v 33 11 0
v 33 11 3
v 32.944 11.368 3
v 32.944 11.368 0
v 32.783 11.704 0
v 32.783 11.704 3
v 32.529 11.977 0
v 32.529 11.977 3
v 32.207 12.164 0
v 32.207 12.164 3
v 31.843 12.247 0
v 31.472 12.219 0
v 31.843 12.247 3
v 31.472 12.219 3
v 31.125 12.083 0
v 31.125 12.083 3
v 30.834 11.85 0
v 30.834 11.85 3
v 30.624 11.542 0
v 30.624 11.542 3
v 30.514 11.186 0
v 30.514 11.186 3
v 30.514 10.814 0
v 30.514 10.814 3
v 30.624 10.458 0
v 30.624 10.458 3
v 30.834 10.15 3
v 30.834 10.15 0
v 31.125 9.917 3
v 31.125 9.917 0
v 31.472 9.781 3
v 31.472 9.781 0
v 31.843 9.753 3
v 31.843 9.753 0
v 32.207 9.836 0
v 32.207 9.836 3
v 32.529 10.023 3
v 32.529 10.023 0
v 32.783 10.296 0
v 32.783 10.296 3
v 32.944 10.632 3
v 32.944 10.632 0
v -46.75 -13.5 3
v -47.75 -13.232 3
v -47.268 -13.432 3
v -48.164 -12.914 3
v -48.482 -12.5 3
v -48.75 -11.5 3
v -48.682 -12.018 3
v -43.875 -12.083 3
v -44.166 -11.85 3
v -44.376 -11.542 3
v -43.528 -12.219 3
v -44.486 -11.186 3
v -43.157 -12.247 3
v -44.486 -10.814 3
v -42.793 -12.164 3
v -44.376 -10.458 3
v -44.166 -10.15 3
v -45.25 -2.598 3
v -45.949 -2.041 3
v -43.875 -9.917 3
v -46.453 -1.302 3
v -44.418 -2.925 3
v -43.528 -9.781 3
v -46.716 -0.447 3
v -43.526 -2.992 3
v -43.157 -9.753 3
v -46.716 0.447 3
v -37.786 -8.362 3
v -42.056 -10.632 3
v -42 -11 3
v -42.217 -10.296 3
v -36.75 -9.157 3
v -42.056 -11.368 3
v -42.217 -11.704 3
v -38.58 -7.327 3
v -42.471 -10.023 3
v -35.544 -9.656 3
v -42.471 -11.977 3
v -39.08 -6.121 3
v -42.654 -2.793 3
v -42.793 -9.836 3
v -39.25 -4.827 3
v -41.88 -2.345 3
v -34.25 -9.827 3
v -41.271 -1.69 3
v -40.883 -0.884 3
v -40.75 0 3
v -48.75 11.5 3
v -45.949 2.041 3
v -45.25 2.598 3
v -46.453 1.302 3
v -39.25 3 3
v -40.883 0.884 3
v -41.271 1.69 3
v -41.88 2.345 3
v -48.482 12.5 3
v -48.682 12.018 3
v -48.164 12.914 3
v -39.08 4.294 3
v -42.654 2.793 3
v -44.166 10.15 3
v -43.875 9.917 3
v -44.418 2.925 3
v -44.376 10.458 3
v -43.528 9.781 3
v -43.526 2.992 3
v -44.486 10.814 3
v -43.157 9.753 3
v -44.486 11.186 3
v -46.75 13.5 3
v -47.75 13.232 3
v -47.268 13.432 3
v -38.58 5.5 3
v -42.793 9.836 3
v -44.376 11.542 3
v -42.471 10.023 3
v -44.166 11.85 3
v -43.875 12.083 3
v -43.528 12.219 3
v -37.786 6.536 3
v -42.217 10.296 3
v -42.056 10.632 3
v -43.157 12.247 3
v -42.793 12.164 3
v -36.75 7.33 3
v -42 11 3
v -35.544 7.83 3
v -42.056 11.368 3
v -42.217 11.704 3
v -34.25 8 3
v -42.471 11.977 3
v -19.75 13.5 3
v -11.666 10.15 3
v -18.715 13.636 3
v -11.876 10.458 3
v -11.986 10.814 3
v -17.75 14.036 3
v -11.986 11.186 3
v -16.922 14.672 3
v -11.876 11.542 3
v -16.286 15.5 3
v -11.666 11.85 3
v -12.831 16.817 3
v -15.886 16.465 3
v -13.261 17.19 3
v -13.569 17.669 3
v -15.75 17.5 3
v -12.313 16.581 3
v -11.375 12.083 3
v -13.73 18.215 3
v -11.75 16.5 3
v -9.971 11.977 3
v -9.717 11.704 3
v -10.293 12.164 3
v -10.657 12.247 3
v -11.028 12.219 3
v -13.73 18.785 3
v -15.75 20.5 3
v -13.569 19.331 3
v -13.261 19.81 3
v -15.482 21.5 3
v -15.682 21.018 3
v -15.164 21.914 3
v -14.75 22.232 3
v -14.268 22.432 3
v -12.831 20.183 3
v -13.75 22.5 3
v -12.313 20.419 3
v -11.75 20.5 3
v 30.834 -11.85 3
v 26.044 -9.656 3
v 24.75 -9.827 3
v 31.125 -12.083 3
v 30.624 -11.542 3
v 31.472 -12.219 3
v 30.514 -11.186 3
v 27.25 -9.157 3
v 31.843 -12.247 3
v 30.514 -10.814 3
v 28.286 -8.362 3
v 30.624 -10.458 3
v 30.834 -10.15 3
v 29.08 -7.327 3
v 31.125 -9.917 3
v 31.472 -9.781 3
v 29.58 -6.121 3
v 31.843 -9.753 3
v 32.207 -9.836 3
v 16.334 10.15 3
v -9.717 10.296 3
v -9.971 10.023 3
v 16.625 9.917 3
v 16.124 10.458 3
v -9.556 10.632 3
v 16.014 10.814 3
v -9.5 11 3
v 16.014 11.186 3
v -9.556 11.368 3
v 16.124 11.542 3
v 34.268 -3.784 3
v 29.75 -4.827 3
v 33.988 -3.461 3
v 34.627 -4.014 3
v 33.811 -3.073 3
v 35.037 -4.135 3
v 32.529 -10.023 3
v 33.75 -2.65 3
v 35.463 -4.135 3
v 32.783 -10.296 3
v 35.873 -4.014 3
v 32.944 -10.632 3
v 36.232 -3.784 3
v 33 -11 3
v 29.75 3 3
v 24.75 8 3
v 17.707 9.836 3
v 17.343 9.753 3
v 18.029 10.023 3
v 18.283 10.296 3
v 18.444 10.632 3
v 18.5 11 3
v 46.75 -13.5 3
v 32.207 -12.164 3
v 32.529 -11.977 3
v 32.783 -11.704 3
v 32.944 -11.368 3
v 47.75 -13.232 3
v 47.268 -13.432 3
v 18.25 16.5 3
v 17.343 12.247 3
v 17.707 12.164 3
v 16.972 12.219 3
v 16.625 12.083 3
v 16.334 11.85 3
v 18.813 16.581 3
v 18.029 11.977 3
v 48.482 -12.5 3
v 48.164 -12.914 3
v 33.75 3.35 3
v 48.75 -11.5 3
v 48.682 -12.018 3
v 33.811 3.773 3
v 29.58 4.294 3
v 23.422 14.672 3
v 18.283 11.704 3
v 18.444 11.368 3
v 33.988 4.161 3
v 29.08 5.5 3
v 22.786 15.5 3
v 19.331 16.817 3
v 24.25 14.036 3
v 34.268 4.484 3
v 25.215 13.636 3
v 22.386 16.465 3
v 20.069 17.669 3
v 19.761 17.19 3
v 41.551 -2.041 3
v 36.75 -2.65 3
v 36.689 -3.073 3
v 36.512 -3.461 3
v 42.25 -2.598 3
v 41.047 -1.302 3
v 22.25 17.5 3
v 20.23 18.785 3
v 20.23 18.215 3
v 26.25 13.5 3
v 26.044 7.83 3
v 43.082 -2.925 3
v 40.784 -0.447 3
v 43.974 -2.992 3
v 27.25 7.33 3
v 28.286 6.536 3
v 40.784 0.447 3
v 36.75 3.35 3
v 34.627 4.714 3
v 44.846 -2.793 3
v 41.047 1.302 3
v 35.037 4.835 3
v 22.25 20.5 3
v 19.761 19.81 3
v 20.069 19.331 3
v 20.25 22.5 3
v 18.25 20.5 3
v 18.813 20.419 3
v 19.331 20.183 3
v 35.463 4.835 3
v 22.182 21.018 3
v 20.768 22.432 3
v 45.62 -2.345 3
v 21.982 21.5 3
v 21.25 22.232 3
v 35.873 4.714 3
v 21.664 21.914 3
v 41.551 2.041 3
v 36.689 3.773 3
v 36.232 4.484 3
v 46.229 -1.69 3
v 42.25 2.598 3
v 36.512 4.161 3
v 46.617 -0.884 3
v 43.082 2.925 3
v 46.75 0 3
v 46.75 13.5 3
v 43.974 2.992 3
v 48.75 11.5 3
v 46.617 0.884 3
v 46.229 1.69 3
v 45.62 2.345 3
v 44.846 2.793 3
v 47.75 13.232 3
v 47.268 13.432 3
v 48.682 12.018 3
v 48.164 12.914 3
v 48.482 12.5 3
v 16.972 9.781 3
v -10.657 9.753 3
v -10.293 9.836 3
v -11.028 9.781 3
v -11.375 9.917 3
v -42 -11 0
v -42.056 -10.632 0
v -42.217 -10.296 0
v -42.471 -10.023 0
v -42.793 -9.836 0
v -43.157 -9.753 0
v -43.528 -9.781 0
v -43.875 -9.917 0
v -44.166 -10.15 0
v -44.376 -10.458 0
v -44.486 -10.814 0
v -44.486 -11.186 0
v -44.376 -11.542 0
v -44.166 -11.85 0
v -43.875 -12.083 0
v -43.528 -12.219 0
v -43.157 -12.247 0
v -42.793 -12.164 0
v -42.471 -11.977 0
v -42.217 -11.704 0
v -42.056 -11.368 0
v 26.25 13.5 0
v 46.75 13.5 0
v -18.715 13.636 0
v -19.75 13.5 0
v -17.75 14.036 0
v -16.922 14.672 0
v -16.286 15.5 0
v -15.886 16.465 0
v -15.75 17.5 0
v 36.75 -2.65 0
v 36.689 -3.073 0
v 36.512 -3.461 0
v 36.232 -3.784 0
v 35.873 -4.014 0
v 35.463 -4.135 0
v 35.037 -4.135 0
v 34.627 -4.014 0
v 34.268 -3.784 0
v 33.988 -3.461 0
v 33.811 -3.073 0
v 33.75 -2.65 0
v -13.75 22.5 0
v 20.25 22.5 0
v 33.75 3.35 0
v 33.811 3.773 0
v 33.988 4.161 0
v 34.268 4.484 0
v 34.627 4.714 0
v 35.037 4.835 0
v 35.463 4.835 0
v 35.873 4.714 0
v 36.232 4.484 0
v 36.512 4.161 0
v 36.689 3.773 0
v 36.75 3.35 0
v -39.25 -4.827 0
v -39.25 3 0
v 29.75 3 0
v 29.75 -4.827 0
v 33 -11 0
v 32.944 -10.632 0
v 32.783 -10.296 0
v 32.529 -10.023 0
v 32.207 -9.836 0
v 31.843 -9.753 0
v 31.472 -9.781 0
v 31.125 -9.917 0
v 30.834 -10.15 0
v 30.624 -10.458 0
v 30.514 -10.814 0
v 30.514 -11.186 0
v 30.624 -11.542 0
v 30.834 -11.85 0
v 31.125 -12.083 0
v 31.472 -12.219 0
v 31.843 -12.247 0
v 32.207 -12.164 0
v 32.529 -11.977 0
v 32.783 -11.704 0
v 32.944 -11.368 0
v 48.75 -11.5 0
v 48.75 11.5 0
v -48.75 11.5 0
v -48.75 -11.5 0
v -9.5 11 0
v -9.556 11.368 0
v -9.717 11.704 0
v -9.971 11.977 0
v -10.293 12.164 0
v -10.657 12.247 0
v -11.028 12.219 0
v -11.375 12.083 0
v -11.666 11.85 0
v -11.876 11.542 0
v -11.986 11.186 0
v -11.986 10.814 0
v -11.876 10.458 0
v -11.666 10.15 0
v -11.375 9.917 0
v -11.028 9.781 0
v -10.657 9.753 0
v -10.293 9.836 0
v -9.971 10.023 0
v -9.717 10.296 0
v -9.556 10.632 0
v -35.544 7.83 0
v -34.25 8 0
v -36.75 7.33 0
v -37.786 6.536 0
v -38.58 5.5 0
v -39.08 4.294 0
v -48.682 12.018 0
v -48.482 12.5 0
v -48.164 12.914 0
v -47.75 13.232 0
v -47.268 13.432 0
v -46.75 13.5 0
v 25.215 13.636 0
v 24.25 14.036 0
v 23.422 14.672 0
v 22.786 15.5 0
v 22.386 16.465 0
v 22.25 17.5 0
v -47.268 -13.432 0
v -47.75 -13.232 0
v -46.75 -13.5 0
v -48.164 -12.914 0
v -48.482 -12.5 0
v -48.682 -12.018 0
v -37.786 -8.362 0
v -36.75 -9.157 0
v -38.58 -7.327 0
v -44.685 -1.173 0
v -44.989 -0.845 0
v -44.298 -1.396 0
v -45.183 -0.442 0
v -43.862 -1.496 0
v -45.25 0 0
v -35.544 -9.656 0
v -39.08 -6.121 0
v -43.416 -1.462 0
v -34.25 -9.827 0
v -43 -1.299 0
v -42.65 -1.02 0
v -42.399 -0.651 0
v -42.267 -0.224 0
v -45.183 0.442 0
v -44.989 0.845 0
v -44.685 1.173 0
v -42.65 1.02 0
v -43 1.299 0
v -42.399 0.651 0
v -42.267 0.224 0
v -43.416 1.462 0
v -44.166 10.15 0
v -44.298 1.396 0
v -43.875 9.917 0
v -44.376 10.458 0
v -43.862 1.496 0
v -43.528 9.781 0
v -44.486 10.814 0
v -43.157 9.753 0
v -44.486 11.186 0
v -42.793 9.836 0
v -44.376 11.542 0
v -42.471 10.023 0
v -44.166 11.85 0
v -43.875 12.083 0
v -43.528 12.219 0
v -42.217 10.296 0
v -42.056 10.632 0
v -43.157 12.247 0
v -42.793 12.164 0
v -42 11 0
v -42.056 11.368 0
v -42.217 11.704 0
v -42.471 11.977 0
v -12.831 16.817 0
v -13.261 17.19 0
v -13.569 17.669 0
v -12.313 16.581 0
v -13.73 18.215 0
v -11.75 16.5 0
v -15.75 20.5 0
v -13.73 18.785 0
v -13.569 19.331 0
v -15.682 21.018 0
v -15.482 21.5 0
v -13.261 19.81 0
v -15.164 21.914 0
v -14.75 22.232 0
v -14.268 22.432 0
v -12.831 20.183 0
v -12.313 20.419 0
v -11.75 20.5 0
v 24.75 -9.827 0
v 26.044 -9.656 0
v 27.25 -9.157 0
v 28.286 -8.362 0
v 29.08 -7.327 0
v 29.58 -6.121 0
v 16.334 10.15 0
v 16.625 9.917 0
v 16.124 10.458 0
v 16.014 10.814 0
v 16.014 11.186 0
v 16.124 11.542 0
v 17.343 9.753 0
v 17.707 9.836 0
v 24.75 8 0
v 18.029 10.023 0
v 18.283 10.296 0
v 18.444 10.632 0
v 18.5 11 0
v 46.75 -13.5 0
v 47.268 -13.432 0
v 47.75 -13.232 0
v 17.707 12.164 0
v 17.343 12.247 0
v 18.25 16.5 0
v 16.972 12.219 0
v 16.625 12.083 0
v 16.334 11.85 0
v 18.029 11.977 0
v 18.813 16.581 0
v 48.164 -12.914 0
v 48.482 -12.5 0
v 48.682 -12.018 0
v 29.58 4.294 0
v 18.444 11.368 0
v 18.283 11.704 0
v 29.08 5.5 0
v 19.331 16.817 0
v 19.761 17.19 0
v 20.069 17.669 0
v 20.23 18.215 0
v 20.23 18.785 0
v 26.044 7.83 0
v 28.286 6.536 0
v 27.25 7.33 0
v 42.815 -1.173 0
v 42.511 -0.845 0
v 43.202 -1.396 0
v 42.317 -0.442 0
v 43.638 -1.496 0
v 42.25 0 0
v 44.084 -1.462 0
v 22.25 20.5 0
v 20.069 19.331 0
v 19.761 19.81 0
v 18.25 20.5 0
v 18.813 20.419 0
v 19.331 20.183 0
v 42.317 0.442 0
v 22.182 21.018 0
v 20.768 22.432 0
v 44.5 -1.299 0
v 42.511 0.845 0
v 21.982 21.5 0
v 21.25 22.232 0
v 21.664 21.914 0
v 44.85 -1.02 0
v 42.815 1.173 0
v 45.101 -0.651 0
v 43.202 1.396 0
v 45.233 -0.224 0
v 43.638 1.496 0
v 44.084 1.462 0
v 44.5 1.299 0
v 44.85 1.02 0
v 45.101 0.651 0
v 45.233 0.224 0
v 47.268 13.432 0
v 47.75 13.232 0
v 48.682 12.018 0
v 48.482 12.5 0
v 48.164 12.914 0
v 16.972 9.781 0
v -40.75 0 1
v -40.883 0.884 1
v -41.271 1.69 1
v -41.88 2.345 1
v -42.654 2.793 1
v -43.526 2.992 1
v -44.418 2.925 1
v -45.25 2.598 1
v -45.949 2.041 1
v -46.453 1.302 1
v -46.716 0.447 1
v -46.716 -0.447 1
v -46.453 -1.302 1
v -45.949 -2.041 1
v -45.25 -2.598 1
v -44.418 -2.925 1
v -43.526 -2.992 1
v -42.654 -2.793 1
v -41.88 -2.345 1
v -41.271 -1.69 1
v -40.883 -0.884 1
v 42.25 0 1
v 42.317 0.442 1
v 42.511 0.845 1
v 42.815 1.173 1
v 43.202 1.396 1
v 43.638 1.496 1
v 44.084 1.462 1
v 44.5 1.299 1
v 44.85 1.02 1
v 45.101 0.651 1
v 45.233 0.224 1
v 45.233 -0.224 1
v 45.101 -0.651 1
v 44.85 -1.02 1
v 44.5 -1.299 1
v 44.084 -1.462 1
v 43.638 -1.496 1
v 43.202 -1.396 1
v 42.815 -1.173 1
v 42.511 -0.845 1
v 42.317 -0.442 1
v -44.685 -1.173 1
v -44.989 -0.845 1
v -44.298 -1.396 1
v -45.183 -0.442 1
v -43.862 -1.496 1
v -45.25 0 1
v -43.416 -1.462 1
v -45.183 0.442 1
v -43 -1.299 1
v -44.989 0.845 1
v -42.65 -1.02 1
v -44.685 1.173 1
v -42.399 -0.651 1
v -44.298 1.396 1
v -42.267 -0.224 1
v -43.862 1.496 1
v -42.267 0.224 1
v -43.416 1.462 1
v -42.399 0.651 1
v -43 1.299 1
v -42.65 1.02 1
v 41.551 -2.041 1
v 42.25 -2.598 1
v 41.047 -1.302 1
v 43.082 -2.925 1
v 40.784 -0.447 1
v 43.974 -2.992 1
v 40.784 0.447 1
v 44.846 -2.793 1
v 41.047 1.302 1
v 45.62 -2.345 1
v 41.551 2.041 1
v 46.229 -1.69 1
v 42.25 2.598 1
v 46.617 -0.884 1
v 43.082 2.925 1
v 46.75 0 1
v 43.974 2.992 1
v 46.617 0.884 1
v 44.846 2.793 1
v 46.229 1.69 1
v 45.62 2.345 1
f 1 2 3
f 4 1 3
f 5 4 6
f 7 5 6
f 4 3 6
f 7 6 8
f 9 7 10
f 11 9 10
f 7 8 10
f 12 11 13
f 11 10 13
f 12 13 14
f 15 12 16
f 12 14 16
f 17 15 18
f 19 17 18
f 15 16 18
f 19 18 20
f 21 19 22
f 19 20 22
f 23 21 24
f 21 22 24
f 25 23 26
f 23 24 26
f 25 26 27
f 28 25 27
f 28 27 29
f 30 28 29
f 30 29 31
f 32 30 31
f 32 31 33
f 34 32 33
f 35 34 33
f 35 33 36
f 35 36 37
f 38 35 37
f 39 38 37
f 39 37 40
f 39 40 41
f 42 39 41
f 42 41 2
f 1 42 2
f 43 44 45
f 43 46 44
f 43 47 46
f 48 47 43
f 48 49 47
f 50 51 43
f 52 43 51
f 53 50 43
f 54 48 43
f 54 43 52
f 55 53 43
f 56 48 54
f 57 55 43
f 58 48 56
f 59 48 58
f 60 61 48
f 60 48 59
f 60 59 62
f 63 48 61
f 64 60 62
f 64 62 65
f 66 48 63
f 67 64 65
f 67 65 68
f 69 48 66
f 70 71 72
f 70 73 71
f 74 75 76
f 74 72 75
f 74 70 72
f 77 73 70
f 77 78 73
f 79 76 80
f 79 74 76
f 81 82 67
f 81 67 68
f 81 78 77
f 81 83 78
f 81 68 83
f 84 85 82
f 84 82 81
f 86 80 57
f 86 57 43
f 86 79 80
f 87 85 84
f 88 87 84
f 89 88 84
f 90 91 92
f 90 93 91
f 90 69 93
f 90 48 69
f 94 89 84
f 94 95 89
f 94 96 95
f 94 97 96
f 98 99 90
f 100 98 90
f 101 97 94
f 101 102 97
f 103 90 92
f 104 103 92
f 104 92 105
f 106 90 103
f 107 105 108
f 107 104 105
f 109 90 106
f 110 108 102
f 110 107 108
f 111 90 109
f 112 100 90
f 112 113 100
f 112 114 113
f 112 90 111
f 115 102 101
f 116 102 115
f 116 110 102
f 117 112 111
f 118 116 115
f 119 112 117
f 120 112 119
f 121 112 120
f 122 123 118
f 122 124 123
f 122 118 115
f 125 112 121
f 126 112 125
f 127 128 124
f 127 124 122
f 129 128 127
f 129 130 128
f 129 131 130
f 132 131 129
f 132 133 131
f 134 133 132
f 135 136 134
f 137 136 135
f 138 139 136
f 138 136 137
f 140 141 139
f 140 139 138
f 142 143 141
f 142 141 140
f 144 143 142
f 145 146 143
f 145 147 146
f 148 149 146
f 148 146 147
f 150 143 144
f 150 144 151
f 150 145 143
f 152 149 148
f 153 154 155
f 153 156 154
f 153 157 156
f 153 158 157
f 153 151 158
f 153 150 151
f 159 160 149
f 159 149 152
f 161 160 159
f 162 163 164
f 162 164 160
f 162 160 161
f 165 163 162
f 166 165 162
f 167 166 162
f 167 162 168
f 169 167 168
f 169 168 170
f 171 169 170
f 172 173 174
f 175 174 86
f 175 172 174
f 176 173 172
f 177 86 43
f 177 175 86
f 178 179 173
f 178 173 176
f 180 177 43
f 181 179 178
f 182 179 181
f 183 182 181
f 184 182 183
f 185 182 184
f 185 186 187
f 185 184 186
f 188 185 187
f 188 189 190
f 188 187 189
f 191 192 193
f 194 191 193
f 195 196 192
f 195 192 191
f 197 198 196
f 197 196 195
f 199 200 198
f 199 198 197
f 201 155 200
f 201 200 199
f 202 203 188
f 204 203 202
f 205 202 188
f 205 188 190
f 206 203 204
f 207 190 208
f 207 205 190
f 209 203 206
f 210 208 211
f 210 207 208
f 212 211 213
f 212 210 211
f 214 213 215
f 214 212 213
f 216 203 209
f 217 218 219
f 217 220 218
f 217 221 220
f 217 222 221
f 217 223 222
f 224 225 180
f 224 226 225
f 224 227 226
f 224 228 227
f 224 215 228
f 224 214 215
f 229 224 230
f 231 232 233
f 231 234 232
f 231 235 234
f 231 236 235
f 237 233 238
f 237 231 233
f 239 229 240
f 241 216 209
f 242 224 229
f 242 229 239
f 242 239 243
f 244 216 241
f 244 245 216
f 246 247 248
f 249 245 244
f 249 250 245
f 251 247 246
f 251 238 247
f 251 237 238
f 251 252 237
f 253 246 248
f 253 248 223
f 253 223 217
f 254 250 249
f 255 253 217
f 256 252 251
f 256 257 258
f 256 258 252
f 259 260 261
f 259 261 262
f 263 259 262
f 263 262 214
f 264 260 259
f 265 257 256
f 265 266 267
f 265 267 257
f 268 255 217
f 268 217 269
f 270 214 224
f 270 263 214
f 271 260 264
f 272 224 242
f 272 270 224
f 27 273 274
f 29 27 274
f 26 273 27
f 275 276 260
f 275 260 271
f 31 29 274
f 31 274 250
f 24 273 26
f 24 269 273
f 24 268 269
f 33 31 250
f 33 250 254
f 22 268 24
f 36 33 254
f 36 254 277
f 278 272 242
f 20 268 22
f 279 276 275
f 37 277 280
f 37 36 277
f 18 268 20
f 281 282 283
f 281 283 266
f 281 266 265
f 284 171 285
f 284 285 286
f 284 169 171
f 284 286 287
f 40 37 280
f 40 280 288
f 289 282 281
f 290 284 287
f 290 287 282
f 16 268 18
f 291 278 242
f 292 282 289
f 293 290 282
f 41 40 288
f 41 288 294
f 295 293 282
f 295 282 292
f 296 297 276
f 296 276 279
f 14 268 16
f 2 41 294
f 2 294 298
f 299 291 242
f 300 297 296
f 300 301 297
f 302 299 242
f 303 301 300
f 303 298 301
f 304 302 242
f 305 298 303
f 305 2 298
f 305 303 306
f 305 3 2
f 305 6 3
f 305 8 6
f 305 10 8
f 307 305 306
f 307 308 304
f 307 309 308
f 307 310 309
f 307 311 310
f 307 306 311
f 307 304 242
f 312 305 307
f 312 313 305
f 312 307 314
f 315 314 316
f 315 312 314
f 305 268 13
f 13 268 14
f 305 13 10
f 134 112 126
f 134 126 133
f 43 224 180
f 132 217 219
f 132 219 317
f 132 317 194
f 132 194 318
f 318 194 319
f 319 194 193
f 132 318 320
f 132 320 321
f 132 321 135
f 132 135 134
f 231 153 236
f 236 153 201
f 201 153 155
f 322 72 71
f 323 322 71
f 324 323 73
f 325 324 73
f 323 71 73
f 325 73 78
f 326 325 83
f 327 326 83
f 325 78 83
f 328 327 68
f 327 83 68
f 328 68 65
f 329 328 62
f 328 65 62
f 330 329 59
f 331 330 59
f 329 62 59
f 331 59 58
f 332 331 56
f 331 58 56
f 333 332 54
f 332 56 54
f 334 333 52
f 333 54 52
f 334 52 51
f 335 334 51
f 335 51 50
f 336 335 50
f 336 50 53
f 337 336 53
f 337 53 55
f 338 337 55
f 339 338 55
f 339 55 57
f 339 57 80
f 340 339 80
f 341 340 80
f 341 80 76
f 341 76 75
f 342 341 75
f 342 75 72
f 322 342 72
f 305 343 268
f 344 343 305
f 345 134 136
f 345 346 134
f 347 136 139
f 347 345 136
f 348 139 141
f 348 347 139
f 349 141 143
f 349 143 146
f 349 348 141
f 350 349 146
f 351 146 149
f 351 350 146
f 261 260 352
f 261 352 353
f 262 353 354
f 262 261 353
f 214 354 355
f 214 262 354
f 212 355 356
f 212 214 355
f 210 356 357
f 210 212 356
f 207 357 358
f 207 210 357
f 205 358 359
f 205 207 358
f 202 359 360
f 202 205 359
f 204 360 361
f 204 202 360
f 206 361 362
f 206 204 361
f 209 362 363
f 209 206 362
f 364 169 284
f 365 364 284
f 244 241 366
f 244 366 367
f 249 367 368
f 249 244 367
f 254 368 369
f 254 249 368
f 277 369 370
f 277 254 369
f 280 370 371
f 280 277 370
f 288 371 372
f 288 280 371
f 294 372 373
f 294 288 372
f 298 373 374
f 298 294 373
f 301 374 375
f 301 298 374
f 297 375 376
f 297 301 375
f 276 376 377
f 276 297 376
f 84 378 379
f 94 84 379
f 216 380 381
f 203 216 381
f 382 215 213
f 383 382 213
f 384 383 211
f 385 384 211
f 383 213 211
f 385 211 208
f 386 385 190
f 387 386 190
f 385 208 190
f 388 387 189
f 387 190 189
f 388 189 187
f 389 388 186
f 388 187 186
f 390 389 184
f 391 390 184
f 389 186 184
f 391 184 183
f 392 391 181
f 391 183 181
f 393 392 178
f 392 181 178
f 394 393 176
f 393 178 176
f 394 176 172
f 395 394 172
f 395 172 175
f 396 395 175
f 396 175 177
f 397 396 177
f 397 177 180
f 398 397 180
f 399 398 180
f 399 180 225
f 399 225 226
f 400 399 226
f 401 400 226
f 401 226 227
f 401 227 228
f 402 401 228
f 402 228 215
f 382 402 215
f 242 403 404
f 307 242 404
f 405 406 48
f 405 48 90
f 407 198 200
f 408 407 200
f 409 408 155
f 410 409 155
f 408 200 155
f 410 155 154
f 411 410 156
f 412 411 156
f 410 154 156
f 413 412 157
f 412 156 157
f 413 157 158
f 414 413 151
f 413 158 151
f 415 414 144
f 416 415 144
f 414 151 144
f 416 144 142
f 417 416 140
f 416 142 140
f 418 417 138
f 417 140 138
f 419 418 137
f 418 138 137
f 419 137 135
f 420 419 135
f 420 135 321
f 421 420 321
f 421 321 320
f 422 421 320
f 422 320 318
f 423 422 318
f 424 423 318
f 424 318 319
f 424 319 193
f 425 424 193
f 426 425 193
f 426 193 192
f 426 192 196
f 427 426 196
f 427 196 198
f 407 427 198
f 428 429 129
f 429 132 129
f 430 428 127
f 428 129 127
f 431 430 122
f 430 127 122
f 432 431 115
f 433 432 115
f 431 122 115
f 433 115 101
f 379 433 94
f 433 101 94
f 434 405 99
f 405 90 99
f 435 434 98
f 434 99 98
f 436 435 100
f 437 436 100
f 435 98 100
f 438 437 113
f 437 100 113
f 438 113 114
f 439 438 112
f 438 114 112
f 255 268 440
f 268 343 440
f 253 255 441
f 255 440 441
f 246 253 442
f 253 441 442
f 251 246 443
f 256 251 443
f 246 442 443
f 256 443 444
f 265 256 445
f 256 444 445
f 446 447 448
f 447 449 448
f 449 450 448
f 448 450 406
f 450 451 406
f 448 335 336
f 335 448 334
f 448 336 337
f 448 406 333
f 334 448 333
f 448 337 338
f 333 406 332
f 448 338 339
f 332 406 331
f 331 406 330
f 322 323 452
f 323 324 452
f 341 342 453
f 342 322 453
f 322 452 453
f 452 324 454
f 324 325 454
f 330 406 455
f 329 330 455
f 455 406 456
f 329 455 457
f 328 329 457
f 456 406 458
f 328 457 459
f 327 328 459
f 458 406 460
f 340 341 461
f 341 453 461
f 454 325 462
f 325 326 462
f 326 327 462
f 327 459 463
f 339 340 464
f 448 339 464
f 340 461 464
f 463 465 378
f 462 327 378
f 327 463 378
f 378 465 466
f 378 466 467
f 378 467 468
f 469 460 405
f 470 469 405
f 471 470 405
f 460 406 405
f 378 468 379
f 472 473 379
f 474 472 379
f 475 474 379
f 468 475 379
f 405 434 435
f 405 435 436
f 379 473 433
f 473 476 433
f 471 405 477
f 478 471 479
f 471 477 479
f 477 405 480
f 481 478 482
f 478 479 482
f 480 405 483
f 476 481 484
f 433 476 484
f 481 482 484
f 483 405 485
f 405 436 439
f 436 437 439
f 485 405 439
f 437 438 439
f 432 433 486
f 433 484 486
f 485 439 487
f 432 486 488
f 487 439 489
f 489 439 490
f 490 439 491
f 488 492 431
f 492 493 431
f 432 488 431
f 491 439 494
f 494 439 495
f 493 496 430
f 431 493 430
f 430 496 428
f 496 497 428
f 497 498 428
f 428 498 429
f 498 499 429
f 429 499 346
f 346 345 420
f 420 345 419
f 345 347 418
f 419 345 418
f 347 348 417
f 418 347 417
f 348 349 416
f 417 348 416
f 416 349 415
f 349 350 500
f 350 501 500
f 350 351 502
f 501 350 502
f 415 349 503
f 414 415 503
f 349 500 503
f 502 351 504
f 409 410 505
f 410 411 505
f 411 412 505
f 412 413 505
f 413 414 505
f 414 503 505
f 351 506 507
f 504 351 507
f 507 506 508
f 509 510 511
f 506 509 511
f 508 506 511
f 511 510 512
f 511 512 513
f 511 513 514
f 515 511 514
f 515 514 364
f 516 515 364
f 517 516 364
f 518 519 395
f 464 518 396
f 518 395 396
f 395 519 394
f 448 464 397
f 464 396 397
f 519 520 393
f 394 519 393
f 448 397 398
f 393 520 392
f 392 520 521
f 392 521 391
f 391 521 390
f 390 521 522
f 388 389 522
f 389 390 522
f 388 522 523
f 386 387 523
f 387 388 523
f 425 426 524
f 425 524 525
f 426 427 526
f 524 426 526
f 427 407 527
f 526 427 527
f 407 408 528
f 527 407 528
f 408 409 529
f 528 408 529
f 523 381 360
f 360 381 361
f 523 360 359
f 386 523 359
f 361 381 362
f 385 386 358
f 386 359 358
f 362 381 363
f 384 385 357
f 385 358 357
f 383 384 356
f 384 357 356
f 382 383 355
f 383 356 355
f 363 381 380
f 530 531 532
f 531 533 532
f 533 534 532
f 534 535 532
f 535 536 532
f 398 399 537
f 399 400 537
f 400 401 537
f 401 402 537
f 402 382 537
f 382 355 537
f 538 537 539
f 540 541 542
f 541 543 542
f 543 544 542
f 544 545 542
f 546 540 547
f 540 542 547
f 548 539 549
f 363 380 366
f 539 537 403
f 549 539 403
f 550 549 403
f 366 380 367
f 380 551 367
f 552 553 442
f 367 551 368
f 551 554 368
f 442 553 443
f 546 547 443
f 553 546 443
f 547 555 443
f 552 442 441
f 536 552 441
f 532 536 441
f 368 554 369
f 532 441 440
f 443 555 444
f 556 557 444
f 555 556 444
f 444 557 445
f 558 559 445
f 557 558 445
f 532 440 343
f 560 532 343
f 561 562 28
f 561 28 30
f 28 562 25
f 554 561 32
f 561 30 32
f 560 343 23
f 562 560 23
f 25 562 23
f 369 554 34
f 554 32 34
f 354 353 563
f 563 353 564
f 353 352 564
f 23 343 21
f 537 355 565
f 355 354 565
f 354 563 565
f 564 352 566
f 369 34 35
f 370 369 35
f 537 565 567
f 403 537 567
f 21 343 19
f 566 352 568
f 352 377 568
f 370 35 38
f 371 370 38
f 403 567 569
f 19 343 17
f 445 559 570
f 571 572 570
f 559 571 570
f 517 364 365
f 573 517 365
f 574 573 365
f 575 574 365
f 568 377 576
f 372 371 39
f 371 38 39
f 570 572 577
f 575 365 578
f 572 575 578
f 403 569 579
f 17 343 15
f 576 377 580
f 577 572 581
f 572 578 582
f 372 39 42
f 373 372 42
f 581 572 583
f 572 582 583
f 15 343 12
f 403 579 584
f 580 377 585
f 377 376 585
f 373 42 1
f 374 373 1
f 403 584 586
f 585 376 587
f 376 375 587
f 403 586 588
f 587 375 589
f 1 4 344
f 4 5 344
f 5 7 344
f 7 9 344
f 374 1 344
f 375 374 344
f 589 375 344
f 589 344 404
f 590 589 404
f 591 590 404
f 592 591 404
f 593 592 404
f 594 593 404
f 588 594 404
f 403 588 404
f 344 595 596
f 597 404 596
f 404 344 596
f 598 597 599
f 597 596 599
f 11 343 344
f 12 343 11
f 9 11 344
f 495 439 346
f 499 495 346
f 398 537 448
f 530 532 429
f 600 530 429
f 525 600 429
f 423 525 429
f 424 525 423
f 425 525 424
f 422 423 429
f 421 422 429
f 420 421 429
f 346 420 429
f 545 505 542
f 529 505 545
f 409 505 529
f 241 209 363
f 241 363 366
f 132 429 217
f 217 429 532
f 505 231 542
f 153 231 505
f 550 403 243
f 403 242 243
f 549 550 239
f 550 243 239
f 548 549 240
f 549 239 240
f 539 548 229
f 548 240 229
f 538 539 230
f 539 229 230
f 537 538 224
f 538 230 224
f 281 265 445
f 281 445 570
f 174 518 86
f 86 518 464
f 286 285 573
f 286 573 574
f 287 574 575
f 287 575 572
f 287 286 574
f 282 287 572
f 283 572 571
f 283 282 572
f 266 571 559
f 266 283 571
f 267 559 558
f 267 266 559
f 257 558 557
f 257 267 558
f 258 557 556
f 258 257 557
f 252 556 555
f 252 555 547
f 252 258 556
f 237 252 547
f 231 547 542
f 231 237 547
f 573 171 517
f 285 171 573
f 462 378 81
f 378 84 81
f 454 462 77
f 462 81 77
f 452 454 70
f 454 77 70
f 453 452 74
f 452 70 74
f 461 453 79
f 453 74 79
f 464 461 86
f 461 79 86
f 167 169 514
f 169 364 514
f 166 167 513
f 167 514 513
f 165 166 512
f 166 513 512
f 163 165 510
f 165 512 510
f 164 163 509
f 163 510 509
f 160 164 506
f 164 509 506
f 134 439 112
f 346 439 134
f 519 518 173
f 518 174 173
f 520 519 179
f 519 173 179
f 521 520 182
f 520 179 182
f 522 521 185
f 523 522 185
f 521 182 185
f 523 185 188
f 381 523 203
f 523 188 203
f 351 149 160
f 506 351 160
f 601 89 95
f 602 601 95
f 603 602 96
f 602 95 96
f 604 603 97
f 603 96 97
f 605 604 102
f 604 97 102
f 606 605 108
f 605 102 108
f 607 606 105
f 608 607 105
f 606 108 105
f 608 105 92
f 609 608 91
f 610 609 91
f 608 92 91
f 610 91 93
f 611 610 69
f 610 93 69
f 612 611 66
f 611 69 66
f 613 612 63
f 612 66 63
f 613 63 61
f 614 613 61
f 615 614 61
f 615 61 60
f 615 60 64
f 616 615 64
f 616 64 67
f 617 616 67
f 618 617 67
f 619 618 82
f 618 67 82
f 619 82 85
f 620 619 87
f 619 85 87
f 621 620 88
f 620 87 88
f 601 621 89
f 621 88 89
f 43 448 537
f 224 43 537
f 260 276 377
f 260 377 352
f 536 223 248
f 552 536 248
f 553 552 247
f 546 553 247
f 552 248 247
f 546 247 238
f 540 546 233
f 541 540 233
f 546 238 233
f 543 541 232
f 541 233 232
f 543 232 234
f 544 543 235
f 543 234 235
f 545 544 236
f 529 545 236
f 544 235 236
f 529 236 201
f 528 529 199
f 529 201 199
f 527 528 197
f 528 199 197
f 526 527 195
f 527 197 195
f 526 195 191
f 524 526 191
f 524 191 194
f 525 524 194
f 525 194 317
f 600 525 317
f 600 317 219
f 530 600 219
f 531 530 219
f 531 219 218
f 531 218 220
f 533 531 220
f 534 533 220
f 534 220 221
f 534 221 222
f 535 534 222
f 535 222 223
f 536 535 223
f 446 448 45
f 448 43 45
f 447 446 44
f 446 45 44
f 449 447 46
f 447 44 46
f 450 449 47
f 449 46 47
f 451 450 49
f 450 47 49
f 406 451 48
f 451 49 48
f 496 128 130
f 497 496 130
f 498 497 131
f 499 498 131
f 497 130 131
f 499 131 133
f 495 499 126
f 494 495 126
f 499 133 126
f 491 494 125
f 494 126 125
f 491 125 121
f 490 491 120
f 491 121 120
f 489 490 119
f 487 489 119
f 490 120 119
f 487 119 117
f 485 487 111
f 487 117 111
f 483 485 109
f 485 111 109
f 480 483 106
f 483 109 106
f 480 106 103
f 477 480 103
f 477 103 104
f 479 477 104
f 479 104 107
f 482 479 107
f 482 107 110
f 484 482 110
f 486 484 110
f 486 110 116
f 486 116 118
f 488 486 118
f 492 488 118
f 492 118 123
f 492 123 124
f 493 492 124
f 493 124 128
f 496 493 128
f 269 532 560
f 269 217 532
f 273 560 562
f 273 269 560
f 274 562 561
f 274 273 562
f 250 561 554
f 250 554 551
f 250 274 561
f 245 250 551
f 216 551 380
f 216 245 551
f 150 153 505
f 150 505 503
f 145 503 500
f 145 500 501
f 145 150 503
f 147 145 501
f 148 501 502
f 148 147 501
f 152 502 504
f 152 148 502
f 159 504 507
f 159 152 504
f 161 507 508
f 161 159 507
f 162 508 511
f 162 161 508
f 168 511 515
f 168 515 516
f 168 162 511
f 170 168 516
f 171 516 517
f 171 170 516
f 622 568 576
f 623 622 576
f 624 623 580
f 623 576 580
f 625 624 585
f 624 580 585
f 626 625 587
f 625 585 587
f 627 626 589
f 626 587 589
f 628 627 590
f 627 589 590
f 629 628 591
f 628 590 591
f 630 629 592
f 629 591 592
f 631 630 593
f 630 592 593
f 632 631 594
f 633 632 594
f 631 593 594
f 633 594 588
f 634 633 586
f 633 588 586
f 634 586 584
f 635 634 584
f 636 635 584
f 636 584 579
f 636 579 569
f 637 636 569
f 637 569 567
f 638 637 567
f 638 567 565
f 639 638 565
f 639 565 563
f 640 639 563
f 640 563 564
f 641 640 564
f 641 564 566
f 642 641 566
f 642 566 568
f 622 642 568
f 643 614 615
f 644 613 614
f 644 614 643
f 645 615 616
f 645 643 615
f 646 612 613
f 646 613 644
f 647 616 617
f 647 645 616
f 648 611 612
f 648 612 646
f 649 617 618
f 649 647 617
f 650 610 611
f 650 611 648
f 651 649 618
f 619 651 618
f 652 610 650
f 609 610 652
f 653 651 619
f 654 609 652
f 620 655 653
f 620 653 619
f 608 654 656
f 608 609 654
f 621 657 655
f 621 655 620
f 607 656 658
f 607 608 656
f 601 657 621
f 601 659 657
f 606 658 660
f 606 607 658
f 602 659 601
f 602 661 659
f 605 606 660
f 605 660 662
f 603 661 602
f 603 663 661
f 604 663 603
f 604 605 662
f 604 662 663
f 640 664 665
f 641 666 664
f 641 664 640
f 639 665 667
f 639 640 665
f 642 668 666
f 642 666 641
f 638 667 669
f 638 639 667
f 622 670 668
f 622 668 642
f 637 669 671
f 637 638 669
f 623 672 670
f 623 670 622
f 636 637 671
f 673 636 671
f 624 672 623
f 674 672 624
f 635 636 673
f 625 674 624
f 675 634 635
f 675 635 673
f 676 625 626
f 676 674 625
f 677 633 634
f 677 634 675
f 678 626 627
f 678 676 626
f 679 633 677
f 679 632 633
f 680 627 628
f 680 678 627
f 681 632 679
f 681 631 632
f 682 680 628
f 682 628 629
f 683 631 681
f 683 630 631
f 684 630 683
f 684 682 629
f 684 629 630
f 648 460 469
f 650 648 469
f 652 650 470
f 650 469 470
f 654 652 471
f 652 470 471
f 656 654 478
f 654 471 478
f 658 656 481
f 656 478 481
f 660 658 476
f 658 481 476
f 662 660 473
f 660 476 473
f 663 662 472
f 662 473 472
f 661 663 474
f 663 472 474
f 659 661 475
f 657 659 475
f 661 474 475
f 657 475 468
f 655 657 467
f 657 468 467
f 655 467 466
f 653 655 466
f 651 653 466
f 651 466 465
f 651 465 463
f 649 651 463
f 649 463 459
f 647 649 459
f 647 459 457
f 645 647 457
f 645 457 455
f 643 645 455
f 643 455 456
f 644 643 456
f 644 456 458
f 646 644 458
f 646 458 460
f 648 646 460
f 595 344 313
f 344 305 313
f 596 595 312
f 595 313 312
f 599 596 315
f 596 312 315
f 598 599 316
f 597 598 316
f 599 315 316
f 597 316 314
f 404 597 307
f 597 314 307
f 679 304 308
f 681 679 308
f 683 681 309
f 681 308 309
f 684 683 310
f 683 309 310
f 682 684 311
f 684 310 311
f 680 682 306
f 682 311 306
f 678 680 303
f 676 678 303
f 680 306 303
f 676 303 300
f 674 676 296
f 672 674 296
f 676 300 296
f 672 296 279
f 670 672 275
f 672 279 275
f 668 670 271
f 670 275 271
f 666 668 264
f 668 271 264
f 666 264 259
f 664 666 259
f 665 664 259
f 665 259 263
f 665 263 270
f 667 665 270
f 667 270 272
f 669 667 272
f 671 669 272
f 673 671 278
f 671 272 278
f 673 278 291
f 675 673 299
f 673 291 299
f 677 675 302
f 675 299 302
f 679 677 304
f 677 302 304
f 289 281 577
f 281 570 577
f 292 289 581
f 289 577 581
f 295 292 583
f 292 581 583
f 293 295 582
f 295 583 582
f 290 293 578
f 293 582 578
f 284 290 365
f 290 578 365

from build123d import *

# Parameters (mm, degrees)
SKETCH_3_W               = 97.5
SKETCH_3_H               = 27
EXTRUDE_1_DEPTH          = 3
SKETCH_4_R               = 1.25
CUT_EXTRUDE_1_DEPTH      = 51.673587795
SKETCH_7_W               = 4
SKETCH_7_H               = 8
EXTRUDE_2_DEPTH          = 5
SKETCH_8_W               = 38
SKETCH_8_H               = 9
EXTRUDE_3_DEPTH          = 3
FILLET_3_R               = 4
FILLET_4_R               = 2
CUT_EXTRUDE_4_DEPTH      = 55.284551209
CUT_EXTRUDE_4_DEPTH_BACK = 5
SKETCH_9_W               = 4
SKETCH_9_H               = 8
SKETCH_13_R              = 1.5
CUT_EXTRUDE_7_DEPTH      = 54.775575311
CUT_EXTRUDE_8_DEPTH      = 54.775575311
SKETCH_16_R              = 3
CUT_EXTRUDE_9_DEPTH      = 2
CUT_EXTRUDE_10_DEPTH     = 10
FILLET_5_R               = 5
FILLET_6_R               = 2


with BuildPart() as part:
    # 草图3 → 凸台-拉伸1 (new body)
    with BuildSketch(Plane.XY):
        Rectangle(SKETCH_3_W, SKETCH_3_H)
    extrude(amount=EXTRUDE_1_DEPTH)

    # 草图4 → 切除-拉伸1 (cut, through all)
    with BuildSketch(Plane.XY.offset(3)):
        with Locations((-43.25, 11)):
            Circle(SKETCH_4_R)
        with Locations((-43.25, -11)):
            Circle(SKETCH_4_R)
        with Locations((31.75, 11)):
            Circle(SKETCH_4_R)
        with Locations((31.75, -11)):
            Circle(SKETCH_4_R)
        with Locations((17.25, 11)):
            Circle(SKETCH_4_R)
        with Locations((-10.75, 11)):
            Circle(SKETCH_4_R)
    extrude(amount=-CUT_EXTRUDE_1_DEPTH, mode=Mode.SUBTRACT)

    # 草图7 → 凸台-拉伸2 (add)
    with BuildSketch(Plane(origin=(0, 0, 0), x_dir=(-1, 0, 0), z_dir=(0, 0, -1))):
        with Locations((46.75, 0.5)):
            Rectangle(SKETCH_7_W, SKETCH_7_H)
        with Locations((-46.75, 0.5)):
            Rectangle(SKETCH_7_W, SKETCH_7_H)
    extrude(amount=EXTRUDE_2_DEPTH)

    # 草图8 → 凸台-拉伸3 (add)
    with BuildSketch(Plane.XY.offset(3)):
        with Locations((3.25, 18)):
            Rectangle(SKETCH_8_W, SKETCH_8_H)
        with BuildLine():
            Line((-11.75, 20.5), (18.25, 20.5))
            ThreePointArc((18.25, 20.5), (20.25, 18.5), (18.25, 16.5))
            Line((18.25, 16.5), (-11.75, 16.5))
            ThreePointArc((-11.75, 16.5), (-13.75, 18.5), (-11.75, 20.5))
        make_face(mode=Mode.SUBTRACT)
    extrude(amount=-EXTRUDE_3_DEPTH)

    # 圆角3
    fillet_3_edges = [part.edges().sort_by_distance(p)[0] for p in [
        (22.25, 13.5, 1.5),
        (-15.75, 13.5, 1.5),
    ]]
    fillet(fillet_3_edges, radius=FILLET_3_R)

    # 圆角4
    fillet_4_edges = [part.edges().sort_by_distance(p)[0] for p in [
        (22.25, 22.5, 1.5),
        (-15.75, 22.5, 1.5),
    ]]
    fillet(fillet_4_edges, radius=FILLET_4_R)

    # 草图9 → 切除-拉伸4 (cut, two sides: drawn at the far end of the back side and taken through both)
    with BuildSketch(Plane(origin=(0, 0, -5), x_dir=(-1, 0, 0), z_dir=(0, 0, -1)).offset(-CUT_EXTRUDE_4_DEPTH_BACK)):
        with Locations((-46.75, 0.5)):
            Rectangle(SKETCH_9_W, SKETCH_9_H)
        with Locations((46.75, 0.5)):
            Rectangle(SKETCH_9_W, SKETCH_9_H)
    extrude(amount=CUT_EXTRUDE_4_DEPTH + CUT_EXTRUDE_4_DEPTH_BACK, mode=Mode.SUBTRACT)

    # 草图13 → 切除-拉伸7 (cut, through all)
    with BuildSketch(Plane(origin=(0, 0, 0), x_dir=(-1, 0, 0), z_dir=(0, 0, -1))):
        with Locations((-43.75, 0)):
            Circle(SKETCH_13_R)
        with Locations((43.75, 0)):
            Circle(SKETCH_13_R)
    extrude(amount=-CUT_EXTRUDE_7_DEPTH, mode=Mode.SUBTRACT)

    # 草图14 → 切除-拉伸8 (cut, through all)
    with BuildSketch(Plane.XY.offset(3)):
        with BuildLine():
            Line((36.75, 3.35), (36.75, -2.65))
            ThreePointArc((36.75, -2.65), (35.25, -4.15), (33.75, -2.65))
            Line((33.75, -2.65), (33.75, 3.35))
            ThreePointArc((33.75, 3.35), (35.25, 4.85), (36.75, 3.35))
        make_face()
    extrude(amount=-CUT_EXTRUDE_8_DEPTH, mode=Mode.SUBTRACT)

    # 草图16 → 切除-拉伸9 (cut)
    with BuildSketch(Plane.XY.offset(3)):
        with Locations((-43.75, 0)):
            Circle(SKETCH_16_R)
        with Locations((43.75, 0)):
            Circle(SKETCH_16_R)
    extrude(amount=-CUT_EXTRUDE_9_DEPTH, mode=Mode.SUBTRACT)

    # 草图17 → 切除-拉伸10 (cut)
    with BuildSketch(Plane(origin=(0, 0, 0), x_dir=(-1, 0, 0), z_dir=(0, 0, -1))):
        Polygon((39.25, -8), (39.25, 8), (-27.75, 8), (-29.75, 8), (-29.75, -9.826666667), (-27.75, -9.826666667), (39.25, -9.826666667), align=None)
    extrude(amount=-CUT_EXTRUDE_10_DEPTH, mode=Mode.SUBTRACT)

    # 圆角5
    fillet_5_edges = [part.edges().sort_by_distance(p)[0] for p in [
        (29.75, 8, 1.5),
        (-39.25, 8, 1.5),
        (-39.25, -9.826666667, 1.5),
        (29.75, -9.826666667, 1.5),
    ]]
    fillet(fillet_5_edges, radius=FILLET_5_R)

    # 圆角6
    fillet_6_edges = [part.edges().sort_by_distance(p)[0] for p in [
        (48.75, -13.5, 1.5),
        (-48.75, -13.5, 1.5),
        (-48.75, 13.5, 1.5),
        (48.75, 13.5, 1.5),
    ]]
    fillet(fillet_6_edges, radius=FILLET_6_R)


solid = part.part
